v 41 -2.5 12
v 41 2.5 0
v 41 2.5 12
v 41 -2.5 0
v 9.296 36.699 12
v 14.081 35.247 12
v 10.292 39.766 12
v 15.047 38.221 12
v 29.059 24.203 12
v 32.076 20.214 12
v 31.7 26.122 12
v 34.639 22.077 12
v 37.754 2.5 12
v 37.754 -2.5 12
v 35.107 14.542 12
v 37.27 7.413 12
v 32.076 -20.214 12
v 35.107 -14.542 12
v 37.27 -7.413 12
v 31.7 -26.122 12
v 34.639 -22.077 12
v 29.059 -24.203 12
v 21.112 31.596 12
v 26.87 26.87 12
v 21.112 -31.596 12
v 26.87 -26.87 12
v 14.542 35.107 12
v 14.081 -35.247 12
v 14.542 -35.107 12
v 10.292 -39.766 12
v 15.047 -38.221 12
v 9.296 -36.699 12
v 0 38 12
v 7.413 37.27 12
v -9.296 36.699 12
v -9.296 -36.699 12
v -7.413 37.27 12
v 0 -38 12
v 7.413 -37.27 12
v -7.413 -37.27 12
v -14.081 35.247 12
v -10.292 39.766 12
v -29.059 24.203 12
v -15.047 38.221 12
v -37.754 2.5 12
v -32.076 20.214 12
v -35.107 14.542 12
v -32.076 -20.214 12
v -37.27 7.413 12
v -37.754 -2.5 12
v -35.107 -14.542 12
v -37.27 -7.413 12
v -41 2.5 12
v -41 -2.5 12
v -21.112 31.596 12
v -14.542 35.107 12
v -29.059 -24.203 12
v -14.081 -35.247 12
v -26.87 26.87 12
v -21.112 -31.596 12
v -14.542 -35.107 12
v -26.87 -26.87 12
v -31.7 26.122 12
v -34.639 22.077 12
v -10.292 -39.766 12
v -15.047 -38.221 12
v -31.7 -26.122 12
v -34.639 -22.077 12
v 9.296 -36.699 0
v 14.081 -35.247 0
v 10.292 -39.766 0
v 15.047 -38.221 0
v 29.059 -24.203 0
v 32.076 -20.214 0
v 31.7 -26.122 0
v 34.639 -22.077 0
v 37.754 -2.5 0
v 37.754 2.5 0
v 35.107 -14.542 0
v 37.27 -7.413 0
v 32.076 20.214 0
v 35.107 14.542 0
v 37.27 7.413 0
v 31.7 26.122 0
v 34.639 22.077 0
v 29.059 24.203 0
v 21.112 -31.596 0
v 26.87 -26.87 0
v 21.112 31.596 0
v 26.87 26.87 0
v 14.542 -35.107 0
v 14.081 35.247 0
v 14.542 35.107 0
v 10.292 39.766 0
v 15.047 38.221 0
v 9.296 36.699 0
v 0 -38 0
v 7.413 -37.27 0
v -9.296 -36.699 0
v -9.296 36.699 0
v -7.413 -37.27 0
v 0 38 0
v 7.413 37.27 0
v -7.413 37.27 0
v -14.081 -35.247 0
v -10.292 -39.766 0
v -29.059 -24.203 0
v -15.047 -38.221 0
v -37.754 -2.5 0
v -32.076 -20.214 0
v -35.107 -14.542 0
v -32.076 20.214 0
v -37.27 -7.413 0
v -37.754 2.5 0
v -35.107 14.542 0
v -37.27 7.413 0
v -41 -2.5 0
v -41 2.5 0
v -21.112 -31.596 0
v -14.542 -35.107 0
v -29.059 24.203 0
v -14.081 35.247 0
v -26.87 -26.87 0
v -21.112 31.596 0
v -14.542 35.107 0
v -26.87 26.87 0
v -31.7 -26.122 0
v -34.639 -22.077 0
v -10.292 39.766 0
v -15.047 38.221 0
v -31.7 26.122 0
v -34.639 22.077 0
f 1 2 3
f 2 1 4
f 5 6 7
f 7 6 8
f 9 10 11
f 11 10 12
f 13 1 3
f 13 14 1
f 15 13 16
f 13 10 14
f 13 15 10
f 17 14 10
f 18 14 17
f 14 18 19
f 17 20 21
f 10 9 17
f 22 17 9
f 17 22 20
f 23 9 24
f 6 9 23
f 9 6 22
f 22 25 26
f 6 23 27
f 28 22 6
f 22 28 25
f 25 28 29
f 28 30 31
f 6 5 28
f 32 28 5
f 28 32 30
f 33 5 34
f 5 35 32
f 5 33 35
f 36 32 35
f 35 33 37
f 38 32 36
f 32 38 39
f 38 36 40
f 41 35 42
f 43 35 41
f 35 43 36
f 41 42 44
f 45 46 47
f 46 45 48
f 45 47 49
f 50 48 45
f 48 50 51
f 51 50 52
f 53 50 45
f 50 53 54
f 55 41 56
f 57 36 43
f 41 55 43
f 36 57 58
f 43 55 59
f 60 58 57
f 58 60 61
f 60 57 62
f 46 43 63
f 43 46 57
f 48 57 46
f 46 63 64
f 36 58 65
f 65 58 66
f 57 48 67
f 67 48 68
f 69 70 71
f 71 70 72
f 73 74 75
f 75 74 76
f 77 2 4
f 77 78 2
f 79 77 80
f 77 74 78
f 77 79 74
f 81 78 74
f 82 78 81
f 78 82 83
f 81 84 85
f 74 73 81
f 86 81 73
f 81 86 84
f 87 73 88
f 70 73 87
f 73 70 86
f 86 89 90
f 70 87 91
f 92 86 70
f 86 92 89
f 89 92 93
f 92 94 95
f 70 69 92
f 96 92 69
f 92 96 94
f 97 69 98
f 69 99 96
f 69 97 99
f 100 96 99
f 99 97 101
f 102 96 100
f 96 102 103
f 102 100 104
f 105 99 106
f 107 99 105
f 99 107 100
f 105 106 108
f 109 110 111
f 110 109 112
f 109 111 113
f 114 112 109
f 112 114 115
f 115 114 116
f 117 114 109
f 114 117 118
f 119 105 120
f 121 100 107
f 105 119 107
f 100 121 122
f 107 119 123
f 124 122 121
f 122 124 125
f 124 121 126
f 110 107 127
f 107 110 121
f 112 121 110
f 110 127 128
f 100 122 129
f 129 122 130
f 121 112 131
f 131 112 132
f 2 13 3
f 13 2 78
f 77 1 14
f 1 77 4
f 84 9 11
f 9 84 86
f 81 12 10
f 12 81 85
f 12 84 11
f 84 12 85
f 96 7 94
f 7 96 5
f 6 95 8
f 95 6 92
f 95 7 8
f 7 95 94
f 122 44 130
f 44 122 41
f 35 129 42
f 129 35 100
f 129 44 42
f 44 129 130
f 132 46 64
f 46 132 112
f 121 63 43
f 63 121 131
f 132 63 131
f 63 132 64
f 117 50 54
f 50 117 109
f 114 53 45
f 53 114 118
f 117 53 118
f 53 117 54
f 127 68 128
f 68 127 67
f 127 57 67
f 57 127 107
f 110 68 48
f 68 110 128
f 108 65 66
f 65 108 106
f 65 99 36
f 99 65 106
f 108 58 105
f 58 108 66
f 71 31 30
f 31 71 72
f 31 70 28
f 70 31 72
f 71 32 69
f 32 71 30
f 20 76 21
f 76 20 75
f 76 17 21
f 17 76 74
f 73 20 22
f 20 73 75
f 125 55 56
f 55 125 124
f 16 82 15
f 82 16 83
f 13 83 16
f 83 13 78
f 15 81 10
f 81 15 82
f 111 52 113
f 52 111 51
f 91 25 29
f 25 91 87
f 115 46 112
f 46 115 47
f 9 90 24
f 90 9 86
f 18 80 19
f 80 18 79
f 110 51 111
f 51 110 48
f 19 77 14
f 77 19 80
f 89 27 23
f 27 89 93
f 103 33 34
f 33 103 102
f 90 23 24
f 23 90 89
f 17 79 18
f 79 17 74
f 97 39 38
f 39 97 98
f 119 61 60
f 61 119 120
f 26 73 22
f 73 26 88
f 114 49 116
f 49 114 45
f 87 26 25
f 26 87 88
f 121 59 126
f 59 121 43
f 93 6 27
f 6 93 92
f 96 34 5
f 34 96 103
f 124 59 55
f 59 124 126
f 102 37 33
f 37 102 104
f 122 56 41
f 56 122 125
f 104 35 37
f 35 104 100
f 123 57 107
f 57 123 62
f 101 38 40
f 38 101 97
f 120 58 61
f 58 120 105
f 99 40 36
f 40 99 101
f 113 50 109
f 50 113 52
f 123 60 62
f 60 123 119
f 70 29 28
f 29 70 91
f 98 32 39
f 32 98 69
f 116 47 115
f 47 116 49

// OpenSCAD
$fn = 32;

// ----------------------------------------------------------------------
// Spur blank: plain gear blank
// ----------------------------------------------------------------------

// --- parameters (mm) ---
disc_r = 38;              // blank root radius
disc_t = 12;              // blank thickness
n_teeth = 10;             // stub tooth count
tooth_w = 5;              // tooth width at the root
tooth_h = 3;              // tooth height above the root

out_r = disc_r + tooth_h;  // tip radius
bbox_x = 82.0;  // measured width over the teeth
bbox_y = 79.53;  // measured depth over the teeth

union() {
  cylinder(r = disc_r, h = disc_t);
  for (i = [0 : n_teeth - 1])
    rotate([0, 0, i * 360 / n_teeth])
      translate([disc_r - 1, -tooth_w / 2, 0])
        cube([tooth_h + 1, tooth_w, disc_t]);
}
